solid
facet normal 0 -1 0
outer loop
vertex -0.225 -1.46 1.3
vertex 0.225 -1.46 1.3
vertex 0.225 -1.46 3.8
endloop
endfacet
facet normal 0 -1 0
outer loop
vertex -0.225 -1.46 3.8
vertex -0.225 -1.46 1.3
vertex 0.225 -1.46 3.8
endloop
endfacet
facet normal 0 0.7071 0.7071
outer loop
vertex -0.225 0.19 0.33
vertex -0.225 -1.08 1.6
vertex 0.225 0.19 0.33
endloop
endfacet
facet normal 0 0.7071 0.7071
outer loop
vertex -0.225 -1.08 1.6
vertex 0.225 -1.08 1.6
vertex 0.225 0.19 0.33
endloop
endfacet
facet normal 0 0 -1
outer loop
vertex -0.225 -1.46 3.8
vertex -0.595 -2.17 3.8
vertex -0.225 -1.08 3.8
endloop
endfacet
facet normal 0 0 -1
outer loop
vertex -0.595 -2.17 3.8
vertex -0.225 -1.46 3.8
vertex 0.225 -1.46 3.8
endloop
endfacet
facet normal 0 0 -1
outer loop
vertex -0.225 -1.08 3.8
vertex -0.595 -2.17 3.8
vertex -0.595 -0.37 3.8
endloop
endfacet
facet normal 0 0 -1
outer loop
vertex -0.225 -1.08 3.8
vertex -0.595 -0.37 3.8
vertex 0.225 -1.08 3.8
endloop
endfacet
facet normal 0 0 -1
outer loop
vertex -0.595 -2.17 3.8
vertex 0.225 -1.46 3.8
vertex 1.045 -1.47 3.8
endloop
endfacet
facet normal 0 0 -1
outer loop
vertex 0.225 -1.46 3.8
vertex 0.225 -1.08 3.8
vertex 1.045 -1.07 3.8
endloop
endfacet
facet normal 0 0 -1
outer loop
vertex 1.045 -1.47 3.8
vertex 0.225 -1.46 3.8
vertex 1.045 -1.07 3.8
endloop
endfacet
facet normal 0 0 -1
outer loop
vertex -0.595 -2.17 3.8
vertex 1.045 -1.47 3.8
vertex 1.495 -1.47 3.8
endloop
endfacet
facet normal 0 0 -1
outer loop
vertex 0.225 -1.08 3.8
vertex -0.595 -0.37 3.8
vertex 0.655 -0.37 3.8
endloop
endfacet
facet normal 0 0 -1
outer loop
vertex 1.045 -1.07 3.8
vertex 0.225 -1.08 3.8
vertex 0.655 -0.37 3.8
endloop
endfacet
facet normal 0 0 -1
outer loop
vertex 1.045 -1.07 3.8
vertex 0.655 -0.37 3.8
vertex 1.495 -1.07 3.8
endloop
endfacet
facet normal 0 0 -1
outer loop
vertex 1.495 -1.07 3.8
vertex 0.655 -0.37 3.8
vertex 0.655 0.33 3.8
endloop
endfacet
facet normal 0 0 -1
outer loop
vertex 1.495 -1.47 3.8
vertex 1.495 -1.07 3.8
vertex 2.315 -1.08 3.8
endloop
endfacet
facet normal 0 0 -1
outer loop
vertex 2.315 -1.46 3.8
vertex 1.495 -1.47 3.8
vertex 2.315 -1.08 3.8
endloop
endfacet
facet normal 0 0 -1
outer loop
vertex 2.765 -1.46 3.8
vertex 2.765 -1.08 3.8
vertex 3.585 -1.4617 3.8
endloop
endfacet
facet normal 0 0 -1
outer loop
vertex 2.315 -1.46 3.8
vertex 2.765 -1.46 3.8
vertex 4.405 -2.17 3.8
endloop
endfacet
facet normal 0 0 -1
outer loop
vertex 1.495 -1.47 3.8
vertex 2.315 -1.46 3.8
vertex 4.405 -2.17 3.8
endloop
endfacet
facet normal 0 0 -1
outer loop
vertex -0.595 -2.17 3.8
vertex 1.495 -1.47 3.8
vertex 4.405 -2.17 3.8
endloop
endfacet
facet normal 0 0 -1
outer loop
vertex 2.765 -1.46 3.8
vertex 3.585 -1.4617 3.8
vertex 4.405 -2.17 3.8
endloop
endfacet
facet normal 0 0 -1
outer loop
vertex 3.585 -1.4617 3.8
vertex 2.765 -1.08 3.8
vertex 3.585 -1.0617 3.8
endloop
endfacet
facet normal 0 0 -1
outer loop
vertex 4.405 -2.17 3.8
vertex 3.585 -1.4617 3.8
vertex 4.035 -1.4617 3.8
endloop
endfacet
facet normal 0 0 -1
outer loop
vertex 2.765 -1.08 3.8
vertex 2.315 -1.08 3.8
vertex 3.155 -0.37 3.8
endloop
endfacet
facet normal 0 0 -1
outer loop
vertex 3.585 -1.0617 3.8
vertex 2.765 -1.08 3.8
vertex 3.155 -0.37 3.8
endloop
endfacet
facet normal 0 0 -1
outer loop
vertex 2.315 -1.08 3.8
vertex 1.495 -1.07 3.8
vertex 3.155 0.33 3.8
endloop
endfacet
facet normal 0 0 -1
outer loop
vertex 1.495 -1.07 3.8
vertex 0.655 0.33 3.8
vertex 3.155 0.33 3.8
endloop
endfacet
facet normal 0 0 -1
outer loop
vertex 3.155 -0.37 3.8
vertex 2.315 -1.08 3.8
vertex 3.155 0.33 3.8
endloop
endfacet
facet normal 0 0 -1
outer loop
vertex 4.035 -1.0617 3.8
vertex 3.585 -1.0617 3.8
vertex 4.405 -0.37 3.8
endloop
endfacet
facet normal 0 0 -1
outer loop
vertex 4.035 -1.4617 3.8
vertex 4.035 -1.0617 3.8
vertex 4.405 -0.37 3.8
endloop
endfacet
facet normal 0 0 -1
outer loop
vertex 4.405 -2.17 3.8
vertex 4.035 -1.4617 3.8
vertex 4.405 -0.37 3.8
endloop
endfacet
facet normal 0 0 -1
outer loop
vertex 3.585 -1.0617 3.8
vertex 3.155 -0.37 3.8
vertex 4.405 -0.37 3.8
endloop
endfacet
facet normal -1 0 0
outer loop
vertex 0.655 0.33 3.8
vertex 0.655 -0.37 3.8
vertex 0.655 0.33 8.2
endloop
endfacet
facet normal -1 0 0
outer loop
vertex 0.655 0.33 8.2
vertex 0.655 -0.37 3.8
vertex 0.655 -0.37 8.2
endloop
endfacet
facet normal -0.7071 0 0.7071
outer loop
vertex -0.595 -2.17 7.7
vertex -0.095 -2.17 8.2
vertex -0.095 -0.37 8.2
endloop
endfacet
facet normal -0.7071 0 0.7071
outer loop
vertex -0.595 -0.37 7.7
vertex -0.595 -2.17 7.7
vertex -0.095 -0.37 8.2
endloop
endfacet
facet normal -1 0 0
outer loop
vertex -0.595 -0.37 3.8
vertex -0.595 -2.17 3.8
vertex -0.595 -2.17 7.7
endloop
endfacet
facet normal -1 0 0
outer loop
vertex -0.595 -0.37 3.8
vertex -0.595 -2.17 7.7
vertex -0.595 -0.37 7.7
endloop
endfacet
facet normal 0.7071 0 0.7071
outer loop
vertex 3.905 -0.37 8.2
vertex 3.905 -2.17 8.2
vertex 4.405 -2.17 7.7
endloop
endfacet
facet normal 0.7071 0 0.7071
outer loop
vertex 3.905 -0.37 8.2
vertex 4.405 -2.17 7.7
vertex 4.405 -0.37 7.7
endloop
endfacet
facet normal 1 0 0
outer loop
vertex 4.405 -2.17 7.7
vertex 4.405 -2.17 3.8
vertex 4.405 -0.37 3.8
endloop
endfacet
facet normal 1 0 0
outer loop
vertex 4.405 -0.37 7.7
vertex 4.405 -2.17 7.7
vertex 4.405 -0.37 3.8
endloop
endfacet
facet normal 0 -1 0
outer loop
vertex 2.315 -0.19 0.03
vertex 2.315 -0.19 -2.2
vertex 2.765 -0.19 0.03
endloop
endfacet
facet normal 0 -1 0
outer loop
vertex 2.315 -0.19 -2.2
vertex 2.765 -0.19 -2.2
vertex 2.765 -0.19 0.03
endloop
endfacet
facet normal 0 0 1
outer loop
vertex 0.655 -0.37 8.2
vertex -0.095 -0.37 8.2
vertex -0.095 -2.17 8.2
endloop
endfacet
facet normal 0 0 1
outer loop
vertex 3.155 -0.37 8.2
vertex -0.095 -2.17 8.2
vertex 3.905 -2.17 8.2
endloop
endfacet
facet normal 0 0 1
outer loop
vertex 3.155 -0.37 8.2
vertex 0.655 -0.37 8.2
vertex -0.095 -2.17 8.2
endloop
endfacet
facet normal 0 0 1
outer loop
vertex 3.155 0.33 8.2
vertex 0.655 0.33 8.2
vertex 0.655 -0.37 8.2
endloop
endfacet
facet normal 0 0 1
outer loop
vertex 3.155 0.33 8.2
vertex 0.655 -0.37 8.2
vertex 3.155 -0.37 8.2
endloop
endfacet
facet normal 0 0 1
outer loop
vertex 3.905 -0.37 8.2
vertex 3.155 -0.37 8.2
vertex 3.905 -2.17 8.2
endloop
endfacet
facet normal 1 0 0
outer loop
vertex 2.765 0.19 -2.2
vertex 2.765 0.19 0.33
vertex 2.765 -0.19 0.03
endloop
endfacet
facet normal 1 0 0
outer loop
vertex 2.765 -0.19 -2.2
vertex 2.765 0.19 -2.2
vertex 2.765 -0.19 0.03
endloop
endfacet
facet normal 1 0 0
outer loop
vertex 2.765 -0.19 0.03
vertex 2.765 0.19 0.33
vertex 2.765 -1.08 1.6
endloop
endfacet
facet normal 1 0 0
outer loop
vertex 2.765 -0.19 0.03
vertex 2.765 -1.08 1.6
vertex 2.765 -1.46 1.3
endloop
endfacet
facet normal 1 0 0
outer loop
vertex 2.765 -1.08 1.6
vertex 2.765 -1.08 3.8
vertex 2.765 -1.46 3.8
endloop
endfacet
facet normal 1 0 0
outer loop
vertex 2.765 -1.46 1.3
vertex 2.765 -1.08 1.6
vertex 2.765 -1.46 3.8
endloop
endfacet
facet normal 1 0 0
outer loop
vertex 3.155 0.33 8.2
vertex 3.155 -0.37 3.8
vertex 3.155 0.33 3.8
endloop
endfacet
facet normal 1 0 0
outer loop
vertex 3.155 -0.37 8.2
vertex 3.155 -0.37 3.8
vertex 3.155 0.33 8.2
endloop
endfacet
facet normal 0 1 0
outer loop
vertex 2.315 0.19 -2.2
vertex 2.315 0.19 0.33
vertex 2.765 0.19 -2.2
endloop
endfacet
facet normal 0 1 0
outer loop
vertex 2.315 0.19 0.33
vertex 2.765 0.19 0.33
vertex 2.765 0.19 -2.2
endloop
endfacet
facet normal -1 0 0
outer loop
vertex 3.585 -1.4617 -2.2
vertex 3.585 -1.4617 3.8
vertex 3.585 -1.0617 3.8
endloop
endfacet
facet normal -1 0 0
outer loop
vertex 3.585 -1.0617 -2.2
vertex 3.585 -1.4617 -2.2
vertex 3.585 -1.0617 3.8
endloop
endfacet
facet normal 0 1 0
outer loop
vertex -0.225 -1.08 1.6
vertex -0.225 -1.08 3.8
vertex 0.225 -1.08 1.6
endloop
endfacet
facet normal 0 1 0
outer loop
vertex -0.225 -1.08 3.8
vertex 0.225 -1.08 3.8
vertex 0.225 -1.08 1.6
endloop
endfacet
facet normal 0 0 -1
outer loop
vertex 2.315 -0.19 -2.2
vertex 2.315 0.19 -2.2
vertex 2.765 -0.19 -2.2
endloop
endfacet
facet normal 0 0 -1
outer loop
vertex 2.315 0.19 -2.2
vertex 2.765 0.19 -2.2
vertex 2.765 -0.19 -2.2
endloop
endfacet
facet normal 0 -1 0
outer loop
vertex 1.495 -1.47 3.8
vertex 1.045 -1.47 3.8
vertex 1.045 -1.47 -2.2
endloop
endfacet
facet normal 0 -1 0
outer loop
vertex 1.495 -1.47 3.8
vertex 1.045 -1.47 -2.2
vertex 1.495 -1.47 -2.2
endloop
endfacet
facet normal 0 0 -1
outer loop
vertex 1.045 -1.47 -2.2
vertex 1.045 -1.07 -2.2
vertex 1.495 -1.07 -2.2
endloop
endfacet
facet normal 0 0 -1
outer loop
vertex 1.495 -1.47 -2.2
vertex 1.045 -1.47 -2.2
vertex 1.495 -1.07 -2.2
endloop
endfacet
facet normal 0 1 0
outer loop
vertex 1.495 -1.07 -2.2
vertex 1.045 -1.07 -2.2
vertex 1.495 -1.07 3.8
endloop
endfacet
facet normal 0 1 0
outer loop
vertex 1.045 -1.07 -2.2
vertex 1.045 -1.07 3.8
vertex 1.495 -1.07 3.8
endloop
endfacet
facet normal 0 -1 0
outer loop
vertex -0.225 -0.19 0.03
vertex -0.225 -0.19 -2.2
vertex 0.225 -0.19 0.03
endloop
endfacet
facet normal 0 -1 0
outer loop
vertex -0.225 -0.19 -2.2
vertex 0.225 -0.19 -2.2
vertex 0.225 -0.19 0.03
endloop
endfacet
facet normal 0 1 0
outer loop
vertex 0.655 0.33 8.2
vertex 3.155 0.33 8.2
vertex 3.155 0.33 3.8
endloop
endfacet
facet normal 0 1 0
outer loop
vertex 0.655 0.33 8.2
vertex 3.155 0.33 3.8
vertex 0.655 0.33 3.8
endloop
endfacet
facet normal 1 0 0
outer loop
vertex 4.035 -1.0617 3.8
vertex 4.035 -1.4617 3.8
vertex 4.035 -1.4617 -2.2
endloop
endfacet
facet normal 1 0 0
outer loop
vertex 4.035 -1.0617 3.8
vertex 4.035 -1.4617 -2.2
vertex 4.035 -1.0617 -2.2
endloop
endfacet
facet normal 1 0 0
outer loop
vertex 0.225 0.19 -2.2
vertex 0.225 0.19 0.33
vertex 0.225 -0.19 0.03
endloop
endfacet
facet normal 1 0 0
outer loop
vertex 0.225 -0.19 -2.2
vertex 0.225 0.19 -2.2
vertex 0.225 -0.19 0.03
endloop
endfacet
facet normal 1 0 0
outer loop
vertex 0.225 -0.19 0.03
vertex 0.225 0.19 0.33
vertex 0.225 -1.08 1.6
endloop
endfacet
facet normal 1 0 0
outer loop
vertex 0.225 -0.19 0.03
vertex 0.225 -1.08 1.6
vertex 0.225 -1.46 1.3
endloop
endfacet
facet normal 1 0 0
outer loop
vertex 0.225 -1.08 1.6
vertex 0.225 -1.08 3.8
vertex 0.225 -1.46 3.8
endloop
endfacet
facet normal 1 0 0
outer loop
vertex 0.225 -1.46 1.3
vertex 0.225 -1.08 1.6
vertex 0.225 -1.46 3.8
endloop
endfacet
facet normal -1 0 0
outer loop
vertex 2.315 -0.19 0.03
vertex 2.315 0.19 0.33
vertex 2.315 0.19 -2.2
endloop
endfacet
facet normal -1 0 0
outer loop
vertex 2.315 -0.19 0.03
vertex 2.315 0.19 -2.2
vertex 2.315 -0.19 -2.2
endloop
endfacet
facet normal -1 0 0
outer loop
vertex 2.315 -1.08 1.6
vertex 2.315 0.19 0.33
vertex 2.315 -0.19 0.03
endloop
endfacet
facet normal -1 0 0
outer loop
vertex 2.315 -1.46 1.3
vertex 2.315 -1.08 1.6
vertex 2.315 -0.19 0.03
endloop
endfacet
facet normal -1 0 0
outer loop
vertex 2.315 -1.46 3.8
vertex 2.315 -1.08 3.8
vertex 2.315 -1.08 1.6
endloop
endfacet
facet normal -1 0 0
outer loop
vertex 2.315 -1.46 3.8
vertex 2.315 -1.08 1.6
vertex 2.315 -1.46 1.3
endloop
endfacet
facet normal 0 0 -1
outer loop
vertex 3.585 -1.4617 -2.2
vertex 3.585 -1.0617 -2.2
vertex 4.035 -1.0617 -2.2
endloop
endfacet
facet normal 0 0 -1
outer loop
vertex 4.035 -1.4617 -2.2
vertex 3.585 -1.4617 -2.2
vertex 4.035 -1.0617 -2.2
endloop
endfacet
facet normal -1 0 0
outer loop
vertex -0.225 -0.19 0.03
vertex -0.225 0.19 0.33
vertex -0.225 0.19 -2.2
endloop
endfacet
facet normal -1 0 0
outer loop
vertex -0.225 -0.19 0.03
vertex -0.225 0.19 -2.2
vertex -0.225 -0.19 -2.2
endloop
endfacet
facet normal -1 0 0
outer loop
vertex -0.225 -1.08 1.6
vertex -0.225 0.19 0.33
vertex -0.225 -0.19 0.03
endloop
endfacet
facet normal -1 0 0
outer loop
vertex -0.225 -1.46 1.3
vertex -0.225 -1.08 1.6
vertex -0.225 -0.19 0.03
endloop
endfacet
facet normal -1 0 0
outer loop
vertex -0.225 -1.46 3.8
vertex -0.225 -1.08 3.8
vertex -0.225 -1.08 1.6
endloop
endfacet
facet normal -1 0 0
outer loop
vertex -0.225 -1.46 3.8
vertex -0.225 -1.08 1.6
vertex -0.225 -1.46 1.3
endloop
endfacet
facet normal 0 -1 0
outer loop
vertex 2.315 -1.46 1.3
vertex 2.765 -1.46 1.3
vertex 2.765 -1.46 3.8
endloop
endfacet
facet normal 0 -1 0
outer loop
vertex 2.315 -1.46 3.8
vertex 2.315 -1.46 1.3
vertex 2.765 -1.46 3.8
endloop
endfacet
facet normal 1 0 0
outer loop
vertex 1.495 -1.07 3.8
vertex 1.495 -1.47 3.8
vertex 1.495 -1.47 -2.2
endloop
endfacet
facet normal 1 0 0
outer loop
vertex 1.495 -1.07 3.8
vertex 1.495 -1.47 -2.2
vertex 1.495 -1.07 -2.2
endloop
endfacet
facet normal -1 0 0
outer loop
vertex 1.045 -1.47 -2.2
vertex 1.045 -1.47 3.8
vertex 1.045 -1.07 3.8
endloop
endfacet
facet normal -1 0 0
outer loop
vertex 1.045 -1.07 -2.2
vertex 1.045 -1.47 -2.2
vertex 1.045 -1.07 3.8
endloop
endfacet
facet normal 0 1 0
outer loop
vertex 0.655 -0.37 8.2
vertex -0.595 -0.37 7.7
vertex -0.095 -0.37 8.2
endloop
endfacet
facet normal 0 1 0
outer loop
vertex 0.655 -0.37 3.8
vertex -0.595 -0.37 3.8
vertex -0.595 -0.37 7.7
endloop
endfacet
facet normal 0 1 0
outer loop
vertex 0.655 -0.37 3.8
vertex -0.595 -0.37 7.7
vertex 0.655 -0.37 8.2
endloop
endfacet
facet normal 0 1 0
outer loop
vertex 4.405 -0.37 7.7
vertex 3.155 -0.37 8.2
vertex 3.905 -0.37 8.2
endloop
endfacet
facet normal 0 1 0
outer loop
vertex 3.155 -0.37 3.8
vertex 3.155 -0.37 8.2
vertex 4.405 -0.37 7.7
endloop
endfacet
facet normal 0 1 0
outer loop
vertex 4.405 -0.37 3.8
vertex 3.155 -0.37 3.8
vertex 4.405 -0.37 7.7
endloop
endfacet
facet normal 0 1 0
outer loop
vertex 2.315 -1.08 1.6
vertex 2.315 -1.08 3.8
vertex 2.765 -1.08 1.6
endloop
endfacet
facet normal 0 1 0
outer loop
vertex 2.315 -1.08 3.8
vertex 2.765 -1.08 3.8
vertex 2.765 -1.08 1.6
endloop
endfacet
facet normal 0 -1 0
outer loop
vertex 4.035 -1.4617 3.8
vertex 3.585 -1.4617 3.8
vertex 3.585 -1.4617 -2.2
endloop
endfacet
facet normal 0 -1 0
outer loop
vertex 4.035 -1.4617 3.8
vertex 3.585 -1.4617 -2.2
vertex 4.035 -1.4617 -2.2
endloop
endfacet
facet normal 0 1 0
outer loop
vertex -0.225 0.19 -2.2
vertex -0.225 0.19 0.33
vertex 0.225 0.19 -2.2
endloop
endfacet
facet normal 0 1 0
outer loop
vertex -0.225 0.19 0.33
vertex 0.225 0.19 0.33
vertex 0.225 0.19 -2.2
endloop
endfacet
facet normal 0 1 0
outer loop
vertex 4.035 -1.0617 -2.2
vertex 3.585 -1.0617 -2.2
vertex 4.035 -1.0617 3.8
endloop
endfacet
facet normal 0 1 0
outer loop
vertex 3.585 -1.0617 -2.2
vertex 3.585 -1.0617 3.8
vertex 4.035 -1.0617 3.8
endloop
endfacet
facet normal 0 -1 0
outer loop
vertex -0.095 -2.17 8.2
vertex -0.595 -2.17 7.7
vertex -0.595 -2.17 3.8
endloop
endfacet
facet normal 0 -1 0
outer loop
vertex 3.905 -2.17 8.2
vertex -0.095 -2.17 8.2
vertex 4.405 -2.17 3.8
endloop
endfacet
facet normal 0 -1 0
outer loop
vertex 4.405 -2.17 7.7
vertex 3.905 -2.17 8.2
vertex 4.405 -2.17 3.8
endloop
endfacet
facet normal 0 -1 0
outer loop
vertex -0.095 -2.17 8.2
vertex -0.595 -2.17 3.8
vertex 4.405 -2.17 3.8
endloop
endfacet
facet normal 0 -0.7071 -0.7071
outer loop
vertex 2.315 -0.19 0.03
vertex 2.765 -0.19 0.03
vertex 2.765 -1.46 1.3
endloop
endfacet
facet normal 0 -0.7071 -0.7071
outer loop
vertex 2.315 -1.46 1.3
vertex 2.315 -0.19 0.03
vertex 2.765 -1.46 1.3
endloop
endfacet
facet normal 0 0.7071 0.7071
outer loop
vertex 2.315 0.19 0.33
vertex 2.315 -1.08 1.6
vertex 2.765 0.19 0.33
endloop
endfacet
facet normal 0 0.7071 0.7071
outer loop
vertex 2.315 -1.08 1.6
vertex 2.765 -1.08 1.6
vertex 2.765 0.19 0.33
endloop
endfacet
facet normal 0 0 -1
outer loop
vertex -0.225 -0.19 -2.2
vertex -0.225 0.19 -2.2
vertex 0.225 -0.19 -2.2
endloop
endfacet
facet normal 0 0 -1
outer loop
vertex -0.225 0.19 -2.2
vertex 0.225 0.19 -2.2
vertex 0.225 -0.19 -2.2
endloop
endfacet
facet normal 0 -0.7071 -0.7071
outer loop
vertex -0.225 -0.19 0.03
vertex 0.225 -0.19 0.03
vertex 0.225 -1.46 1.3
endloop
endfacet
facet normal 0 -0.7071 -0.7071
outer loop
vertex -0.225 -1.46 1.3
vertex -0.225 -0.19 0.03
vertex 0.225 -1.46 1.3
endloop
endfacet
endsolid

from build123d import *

# Parameters (mm, degrees)
SKETCH004_W    = 0.45
SKETCH004_H    = 0.4
PAD_DEPTH      = 3.8
PAD_DEPTH_BACK = 2.2
PAD003_DEPTH   = 0.225
PAD002_DEPTH   = 0.225
SKETCH_W       = 5
SKETCH_H       = 1.8
PAD004_DEPTH   = 4.4
CHAMFER_SIZE   = 0.5
SKETCH005_W    = 2.5
SKETCH005_H    = 4.4
PAD005_DEPTH   = 0.7


with BuildPart() as pad:
    # Sketch004 → Pad (new body, two sides)
    with BuildSketch(Plane.XY) as pad_sk:
        with Locations((1.27, -1.27)):
            Rectangle(SKETCH004_W, SKETCH004_H)
        with Locations((3.81, -1.261698)):
            Rectangle(SKETCH004_W, SKETCH004_H)
    extrude(amount=PAD_DEPTH)
    extrude(pad_sk.sketch, amount=-PAD_DEPTH_BACK)


with BuildPart() as pad003:
    # Sketch003 → Pad003 (new body, symmetric)
    with BuildSketch(Plane(origin=(2.54, -1.27, 0), x_dir=(0, 1, 0), z_dir=(1, 0, 0))):
        Polygon((-0.19, 3.8), (0.19, 3.8), (0.19, 1.6), (1.46, 0.33), (1.46, -2.2), (1.08, -2.2), (1.08, 0.03), (-0.19, 1.3), align=None)
    extrude(amount=PAD003_DEPTH, both=True)


with BuildPart() as pad002:
    # Sketch002 → Pad002 (new body, symmetric)
    with BuildSketch(Plane(origin=(0, -1.27, 0), x_dir=(0, 1, 0), z_dir=(1, 0, 0))):
        Polygon((-0.19, 3.8), (0.19, 3.8), (0.19, 1.6), (1.46, 0.33), (1.46, -2.2), (1.08, -2.2), (1.08, 0.03), (-0.19, 1.3), align=None)
    extrude(amount=PAD002_DEPTH, both=True)


with BuildPart() as sharp_is471f:
    # Sketch → Pad004 (new body)
    with BuildSketch(Plane.XY.offset(3.8)):
        with Locations((1.905, -1.27)):
            Rectangle(SKETCH_W, SKETCH_H)
    extrude(amount=PAD004_DEPTH)

    # Chamfer
    chamfer_edges = [sharp_is471f.edges().sort_by_distance(p)[0] for p in [
        (4.405, -1.27, 8.2),
        (-0.595, -1.27, 8.2),
    ]]
    chamfer(chamfer_edges, length=CHAMFER_SIZE)

    # Sketch005 → Pad005 (new body)
    with BuildSketch(Plane(origin=(0, -0.37, 3.8), x_dir=(-1, 0, 0), z_dir=(0, 1, 0))):
        with Locations((-1.905, 2.2)):
            Rectangle(SKETCH005_W, SKETCH005_H)
    extrude(amount=PAD005_DEPTH)

    # Pad005_mp_cp: union Pad, Pad003, Pad002
    add(pad.part)
    add(pad003.part)
    add(pad002.part)


solid = sharp_is471f.part
